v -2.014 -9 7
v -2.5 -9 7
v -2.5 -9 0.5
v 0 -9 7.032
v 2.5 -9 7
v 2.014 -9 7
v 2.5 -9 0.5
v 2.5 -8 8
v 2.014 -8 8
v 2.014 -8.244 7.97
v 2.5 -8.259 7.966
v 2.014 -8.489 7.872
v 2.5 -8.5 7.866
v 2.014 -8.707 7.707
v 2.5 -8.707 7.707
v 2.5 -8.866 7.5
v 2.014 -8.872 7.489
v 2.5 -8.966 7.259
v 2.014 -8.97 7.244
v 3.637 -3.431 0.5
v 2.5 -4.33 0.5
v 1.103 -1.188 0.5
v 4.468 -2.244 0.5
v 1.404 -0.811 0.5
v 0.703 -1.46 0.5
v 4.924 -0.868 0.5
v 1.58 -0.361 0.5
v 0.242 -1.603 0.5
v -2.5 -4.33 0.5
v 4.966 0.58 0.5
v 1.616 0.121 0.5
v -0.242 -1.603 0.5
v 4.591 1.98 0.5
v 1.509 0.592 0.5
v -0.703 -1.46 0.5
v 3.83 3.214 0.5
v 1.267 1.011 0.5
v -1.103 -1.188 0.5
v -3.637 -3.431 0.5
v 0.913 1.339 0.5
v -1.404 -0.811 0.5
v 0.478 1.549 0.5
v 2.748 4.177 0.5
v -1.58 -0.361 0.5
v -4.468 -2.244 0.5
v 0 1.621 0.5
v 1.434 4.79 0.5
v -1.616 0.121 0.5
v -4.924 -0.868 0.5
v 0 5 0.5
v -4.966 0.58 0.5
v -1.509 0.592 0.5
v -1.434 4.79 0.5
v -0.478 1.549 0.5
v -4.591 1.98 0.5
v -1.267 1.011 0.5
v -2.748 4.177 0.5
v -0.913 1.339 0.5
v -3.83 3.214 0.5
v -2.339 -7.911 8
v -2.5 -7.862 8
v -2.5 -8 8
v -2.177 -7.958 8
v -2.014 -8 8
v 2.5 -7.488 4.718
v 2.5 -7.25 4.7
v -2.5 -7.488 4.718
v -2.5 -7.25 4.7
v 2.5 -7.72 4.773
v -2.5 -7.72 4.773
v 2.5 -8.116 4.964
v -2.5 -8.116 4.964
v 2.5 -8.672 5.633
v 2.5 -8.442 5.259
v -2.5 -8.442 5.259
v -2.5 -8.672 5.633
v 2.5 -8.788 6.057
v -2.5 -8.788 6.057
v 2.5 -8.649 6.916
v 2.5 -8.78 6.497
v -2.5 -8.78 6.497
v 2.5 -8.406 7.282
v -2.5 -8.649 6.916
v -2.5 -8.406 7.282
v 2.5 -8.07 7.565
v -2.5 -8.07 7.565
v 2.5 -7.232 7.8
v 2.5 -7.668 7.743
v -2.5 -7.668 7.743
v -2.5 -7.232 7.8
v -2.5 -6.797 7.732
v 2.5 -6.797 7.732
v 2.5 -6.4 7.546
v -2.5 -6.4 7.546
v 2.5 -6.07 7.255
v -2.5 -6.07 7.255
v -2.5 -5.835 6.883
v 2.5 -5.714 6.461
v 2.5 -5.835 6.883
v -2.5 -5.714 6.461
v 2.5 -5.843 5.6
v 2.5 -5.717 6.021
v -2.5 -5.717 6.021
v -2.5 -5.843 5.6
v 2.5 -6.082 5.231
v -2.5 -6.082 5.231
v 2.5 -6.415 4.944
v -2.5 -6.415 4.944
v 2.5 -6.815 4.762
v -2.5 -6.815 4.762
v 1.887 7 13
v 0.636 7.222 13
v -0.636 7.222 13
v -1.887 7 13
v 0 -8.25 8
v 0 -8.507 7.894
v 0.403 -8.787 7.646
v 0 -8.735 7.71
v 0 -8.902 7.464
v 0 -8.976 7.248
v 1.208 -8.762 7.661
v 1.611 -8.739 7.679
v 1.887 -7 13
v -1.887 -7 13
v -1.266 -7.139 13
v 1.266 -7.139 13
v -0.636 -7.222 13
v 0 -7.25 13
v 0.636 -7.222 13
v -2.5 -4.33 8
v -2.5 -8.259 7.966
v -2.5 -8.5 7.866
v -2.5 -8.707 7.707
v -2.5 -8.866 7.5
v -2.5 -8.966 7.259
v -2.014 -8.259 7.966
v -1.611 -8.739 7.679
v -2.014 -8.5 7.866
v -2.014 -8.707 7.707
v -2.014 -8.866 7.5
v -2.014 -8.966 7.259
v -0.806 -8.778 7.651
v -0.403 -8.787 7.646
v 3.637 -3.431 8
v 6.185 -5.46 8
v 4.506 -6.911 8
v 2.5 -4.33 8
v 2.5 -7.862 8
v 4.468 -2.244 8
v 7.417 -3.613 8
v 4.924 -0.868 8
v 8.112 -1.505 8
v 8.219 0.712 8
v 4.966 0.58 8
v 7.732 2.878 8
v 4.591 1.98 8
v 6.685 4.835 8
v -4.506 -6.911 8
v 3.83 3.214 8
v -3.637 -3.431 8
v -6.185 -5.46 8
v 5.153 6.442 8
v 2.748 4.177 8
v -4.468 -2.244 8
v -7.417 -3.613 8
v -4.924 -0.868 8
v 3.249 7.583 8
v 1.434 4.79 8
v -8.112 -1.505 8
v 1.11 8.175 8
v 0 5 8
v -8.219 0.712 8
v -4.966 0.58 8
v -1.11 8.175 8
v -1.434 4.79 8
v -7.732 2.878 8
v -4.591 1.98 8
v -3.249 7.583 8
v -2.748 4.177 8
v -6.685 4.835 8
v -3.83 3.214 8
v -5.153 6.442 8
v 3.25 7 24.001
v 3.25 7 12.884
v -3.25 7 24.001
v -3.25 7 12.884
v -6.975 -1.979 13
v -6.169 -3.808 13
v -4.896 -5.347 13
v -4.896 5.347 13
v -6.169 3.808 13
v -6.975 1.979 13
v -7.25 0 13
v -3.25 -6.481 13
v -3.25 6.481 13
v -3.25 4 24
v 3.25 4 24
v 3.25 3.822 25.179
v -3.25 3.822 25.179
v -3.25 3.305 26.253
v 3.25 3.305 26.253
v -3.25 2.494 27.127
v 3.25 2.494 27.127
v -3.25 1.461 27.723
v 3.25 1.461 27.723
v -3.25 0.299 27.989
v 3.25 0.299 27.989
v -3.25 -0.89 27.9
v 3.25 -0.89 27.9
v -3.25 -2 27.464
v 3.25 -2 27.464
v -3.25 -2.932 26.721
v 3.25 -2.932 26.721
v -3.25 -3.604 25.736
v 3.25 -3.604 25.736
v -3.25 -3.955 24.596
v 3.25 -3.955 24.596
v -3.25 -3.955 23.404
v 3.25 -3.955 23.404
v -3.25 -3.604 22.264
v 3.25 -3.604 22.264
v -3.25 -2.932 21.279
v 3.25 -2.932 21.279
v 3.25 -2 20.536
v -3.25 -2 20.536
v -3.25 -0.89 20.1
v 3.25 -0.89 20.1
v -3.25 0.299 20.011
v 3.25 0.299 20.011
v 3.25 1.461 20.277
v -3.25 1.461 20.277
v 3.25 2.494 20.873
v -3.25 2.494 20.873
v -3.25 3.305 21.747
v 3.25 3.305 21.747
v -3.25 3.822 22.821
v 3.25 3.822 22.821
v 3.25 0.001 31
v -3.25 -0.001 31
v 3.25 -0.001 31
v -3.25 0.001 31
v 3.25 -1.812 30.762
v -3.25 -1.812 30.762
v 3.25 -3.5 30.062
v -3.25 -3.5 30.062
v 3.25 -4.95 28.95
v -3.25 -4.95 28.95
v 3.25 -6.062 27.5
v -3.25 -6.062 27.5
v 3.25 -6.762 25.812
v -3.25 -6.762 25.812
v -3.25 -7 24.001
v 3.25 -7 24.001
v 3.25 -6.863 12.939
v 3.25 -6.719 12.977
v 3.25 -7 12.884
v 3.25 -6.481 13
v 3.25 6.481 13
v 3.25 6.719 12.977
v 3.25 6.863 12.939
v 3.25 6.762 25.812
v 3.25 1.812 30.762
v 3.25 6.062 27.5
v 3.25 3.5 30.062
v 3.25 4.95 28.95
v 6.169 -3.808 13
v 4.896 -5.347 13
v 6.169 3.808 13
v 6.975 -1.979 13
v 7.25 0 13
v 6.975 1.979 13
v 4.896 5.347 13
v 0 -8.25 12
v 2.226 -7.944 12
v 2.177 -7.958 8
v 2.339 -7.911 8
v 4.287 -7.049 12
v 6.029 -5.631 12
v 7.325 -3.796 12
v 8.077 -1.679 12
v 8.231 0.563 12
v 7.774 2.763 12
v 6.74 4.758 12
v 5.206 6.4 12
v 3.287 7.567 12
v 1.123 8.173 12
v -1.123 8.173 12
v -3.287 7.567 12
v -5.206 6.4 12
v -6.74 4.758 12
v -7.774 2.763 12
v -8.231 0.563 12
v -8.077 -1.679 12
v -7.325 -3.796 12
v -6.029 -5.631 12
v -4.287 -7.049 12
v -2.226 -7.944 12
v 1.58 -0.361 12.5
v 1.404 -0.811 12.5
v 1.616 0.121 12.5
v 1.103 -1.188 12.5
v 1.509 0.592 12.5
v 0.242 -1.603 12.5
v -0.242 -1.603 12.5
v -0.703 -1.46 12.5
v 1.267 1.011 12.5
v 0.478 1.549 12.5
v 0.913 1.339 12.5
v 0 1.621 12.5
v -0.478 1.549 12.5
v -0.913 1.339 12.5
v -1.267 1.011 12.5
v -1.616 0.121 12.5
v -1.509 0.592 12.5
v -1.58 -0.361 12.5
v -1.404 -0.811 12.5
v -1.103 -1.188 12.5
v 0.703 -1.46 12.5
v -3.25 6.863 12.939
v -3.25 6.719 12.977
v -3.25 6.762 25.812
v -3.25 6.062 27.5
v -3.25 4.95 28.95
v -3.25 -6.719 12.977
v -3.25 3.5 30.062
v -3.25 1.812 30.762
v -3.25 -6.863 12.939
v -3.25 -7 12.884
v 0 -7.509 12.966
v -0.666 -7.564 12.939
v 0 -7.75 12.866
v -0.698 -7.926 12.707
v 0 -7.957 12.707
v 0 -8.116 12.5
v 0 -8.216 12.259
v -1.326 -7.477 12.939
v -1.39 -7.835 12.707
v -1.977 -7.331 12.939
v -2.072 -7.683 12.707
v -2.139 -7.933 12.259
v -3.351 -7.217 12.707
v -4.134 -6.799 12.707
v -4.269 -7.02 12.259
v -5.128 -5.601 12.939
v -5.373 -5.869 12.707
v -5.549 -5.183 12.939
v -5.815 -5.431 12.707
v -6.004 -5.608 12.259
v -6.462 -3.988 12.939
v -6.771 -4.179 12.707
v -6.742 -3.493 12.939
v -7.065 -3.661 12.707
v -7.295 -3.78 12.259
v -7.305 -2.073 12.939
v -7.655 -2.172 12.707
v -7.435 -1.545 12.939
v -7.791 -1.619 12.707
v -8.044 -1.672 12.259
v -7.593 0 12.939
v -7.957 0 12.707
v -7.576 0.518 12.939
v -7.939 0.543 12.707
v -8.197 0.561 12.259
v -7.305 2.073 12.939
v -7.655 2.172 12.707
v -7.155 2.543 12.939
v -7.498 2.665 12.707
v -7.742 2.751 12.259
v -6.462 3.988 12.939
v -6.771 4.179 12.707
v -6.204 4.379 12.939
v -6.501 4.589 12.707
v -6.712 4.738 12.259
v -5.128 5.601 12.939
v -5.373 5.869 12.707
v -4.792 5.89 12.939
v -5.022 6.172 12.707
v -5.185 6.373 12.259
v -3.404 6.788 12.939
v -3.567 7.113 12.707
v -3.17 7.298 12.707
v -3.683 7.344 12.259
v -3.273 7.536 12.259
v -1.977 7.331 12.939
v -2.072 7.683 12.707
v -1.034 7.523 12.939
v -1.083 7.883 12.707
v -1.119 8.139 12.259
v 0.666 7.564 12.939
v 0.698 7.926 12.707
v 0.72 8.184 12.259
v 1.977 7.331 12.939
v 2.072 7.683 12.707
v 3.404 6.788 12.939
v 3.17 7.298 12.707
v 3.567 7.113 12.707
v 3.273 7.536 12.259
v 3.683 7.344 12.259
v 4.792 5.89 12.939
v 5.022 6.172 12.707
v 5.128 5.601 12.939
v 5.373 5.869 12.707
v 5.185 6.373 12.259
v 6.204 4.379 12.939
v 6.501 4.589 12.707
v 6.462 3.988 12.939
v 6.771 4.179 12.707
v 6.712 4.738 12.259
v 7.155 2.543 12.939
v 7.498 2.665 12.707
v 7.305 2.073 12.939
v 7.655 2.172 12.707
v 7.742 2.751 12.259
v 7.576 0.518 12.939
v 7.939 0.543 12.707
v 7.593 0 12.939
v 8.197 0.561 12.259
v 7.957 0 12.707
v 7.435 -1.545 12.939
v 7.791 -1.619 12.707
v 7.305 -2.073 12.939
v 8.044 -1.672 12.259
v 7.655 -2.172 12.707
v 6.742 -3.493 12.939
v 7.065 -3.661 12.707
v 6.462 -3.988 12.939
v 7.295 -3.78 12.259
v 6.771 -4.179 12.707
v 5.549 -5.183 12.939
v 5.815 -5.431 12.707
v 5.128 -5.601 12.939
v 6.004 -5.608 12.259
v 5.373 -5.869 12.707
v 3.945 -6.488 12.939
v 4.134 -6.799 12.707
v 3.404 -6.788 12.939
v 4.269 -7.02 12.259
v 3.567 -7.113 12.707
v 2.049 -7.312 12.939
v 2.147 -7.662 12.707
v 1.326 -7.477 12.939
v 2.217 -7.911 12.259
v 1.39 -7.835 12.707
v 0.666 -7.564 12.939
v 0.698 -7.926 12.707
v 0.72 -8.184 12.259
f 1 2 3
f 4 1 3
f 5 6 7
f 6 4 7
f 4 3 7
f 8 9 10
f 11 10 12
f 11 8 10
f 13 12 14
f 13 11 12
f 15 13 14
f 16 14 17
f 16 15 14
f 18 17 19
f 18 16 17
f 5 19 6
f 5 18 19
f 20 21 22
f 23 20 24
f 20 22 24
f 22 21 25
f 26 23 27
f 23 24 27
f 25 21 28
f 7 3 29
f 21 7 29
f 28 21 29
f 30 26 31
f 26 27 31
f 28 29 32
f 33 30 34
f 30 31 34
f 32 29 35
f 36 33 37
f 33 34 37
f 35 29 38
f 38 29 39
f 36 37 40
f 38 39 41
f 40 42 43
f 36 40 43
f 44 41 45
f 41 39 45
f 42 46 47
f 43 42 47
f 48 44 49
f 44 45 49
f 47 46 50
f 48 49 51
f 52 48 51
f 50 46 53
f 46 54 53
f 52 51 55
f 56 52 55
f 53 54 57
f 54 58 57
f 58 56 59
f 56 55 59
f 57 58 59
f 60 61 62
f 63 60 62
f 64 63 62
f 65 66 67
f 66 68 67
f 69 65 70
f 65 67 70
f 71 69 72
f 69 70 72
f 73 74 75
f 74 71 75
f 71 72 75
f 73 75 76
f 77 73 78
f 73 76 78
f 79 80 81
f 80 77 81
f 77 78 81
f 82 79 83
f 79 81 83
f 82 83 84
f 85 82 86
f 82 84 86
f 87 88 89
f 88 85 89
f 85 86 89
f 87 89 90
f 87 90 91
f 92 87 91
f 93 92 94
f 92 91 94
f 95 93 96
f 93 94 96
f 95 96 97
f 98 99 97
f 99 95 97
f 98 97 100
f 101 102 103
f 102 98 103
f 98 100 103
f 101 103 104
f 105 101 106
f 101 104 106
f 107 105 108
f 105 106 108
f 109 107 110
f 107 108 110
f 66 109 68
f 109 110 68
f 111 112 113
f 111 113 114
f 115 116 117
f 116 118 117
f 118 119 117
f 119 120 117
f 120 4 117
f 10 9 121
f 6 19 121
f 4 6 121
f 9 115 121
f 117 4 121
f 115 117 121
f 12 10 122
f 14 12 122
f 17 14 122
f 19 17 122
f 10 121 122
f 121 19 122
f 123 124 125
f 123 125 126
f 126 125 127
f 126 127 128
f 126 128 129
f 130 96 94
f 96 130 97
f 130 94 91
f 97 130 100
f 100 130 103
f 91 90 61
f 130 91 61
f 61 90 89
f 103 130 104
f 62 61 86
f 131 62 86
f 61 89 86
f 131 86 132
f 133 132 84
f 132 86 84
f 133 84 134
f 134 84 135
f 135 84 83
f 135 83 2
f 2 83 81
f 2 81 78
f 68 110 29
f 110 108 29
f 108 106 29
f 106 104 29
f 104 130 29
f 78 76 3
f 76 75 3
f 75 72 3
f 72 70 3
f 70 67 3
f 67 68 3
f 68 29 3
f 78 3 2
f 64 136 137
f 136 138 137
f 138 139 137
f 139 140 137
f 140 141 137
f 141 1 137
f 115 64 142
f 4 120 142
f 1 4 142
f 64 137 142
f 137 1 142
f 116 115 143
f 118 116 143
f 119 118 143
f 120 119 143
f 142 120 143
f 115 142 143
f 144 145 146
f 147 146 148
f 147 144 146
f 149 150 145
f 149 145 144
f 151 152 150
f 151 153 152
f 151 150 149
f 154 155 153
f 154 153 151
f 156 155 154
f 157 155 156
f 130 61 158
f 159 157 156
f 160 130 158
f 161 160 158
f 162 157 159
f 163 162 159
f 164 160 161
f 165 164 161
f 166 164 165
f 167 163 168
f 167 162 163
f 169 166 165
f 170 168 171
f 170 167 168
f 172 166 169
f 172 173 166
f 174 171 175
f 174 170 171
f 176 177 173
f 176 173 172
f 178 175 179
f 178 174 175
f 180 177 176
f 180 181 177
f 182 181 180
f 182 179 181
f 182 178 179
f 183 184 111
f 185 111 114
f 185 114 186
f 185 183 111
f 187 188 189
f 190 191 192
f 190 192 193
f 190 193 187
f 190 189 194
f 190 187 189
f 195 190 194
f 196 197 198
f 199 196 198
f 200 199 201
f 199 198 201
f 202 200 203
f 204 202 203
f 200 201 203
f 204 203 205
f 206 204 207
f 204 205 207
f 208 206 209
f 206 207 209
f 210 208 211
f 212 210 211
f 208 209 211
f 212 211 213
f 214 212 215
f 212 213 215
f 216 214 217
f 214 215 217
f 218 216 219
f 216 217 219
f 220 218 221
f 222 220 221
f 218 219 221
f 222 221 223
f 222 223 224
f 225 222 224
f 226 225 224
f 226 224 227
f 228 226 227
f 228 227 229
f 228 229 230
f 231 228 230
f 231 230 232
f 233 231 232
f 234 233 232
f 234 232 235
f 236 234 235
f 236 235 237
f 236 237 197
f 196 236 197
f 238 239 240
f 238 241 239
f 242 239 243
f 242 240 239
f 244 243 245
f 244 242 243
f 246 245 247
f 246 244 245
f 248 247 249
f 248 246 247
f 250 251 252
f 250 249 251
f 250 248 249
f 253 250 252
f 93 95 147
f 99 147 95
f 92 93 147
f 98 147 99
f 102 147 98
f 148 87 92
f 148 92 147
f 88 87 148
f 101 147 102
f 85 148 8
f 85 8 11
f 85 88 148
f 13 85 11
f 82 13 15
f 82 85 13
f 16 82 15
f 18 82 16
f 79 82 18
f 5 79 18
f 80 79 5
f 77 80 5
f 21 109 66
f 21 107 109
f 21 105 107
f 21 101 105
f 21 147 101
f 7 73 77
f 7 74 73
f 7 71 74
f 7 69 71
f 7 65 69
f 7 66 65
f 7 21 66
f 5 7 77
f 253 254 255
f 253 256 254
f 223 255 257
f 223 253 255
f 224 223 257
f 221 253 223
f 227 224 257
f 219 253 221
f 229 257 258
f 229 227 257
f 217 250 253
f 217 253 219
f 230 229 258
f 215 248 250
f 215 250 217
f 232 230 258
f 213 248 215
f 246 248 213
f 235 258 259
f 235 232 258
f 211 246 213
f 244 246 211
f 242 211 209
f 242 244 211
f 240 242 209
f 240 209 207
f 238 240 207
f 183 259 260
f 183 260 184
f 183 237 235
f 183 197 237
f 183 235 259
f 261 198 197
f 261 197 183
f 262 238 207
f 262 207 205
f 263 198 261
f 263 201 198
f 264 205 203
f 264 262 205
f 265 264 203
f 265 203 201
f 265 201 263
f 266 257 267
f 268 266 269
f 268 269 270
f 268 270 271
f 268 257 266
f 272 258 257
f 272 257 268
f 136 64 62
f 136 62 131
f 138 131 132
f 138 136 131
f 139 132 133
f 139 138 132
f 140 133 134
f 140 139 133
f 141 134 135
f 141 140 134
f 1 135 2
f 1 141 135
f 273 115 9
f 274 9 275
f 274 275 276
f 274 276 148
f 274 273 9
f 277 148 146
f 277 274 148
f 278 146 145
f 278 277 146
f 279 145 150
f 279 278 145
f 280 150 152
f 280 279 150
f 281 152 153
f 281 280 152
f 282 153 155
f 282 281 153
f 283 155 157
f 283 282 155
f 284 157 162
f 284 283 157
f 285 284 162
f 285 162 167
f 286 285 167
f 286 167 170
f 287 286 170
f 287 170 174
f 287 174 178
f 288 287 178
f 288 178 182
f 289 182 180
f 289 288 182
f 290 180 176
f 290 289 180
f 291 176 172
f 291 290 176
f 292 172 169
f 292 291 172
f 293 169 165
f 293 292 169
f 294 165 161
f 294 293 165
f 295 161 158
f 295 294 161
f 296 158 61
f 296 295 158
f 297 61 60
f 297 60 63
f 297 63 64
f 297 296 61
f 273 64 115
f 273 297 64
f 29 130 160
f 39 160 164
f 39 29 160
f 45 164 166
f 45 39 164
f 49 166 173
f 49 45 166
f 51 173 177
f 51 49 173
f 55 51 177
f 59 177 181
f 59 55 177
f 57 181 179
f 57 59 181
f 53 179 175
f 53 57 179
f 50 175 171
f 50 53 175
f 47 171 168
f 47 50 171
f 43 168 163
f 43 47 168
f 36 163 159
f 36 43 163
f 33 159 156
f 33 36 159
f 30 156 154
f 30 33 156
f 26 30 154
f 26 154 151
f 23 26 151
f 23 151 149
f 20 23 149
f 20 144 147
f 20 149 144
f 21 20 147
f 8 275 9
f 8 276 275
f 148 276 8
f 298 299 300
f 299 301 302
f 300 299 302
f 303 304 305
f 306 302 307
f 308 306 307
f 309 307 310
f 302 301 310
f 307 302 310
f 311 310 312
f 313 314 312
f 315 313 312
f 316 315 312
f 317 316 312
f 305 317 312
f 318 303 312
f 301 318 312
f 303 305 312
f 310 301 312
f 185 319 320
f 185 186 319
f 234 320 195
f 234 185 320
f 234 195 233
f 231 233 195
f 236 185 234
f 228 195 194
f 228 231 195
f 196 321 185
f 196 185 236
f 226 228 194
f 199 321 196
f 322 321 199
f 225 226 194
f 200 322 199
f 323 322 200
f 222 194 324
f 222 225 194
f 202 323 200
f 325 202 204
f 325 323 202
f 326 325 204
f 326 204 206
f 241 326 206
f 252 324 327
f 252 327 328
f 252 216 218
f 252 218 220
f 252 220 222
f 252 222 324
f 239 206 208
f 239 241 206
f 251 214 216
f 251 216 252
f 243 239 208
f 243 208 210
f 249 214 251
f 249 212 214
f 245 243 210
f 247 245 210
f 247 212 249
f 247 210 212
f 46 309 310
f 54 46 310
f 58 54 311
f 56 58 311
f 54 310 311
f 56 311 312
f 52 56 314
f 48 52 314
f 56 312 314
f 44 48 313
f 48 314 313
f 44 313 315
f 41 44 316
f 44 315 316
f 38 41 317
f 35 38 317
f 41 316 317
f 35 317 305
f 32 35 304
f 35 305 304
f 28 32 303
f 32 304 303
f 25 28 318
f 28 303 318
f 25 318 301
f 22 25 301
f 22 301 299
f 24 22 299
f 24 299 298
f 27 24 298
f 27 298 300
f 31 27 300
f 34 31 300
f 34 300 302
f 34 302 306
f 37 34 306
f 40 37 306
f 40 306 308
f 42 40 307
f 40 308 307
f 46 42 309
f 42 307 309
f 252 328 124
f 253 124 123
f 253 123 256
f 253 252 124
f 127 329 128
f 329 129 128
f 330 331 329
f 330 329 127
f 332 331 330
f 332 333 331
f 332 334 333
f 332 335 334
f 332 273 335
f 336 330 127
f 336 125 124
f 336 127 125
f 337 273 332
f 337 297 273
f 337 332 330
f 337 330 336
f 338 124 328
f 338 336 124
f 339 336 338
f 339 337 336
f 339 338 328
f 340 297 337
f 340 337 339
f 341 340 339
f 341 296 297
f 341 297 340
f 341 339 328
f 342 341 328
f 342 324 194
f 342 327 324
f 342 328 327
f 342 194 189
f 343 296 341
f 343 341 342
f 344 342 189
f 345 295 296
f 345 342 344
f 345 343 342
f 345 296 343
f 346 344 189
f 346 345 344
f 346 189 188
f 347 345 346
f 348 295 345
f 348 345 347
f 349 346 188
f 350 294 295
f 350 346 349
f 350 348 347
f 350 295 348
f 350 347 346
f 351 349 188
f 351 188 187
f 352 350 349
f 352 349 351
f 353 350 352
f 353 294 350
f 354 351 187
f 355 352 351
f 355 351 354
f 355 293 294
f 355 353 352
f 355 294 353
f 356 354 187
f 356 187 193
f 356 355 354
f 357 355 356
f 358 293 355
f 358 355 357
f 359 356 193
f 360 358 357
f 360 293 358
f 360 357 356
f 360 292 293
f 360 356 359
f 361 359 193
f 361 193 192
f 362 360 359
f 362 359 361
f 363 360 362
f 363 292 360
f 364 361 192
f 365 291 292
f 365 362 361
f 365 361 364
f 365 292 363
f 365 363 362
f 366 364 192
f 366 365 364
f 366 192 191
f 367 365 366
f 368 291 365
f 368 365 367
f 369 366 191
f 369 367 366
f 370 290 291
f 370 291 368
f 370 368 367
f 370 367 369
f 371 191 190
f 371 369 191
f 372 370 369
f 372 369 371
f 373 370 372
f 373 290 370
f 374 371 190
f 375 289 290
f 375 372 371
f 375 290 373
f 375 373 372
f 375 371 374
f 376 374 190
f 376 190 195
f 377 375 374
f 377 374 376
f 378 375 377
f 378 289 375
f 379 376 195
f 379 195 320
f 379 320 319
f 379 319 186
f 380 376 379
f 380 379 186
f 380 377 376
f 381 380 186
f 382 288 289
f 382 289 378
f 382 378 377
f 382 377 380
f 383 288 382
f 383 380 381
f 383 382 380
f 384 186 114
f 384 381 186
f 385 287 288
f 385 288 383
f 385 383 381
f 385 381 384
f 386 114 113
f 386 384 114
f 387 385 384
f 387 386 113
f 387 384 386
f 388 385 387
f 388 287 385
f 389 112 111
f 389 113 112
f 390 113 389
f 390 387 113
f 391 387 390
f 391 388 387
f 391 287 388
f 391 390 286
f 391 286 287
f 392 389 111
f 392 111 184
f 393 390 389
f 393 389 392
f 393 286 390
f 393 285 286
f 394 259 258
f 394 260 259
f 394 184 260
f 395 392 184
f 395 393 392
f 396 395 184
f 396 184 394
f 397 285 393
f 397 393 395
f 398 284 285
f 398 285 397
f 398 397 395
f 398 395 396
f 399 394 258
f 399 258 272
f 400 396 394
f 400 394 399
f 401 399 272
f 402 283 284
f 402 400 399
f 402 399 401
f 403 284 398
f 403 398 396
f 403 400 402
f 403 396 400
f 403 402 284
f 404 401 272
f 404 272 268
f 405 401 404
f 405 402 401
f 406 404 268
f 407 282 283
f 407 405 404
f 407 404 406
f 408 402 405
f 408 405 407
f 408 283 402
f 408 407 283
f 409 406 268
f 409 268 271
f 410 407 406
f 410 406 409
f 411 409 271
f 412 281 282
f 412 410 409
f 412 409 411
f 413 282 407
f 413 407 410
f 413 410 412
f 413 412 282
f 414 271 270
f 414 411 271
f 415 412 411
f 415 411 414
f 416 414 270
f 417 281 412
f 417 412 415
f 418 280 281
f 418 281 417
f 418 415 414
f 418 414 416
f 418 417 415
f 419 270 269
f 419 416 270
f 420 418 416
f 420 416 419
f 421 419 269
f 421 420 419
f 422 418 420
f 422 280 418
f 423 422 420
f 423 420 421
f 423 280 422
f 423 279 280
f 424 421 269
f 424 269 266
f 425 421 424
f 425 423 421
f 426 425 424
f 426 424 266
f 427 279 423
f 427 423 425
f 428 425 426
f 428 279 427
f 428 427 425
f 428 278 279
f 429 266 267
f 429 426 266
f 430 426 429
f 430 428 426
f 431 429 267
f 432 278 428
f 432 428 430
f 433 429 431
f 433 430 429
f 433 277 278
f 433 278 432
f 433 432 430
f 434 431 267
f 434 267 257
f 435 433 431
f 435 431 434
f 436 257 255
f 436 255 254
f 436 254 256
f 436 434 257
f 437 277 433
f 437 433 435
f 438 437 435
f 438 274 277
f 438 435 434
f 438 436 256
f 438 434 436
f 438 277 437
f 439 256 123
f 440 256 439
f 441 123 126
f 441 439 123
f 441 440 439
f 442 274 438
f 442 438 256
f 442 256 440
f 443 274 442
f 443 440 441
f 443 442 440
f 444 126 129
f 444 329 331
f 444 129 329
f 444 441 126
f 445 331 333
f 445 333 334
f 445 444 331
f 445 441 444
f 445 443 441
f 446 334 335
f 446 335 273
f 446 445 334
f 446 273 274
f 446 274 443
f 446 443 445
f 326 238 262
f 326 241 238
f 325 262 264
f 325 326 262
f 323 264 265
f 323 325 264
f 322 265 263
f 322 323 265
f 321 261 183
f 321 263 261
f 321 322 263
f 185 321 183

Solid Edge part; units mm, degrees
sketch "Sketch1" plane through (0, 0, 0) normal (0, 0, 1) x (1, 0, 0)
  circle A0 centre (0, 0) radius 9.75
  dimension "D1" = 19.5
extrude "Protrusion1" add sketch "Sketch1" along normal blind 31
sketch "Sketch2" plane through (0, 0, 0) normal (0, 0, -1) x (1, 0, 0)
  line L0 (-2.5, 4.3301) -> (-2.5, 9)
  line L1 (-2.5, 9) -> (2.5, 9)
  line L2 (2.5, 4.3301) -> (2.5, 9)
  arc A0 (2.5, 4.3301) -> (-2.5, 4.3301) centre (0, 0) cw
extrude "Extrusionsausschnitt_1" cut sketch "Sketch2" against normal blind 8 flip side to cut
sketch "Sketch3" plane through (0, 0, 31) normal (0, 0, 1) x (0, -1, 0)
  circle A0 centre (0, 0) radius 8.25
  dimension "D1" = 16.5
extrude "Extrusionsausschnitt_2" cut sketch "Sketch3" against normal blind 23 flip side to cut
hole "Bohrung_1" at (2.5, -7.25, 6.25) direction (-1, 0, 0) diameter 3.1 end up to next
sketch "Sketch4" plane through (0, 0, 31) normal (0, 0, 1) x (0, 1, 0)
  line L0 (-7, -3.25) -> (7, -3.25)
  line L1 (7, -3.25) -> (7, 3.25)
  line L2 (7, 3.25) -> (-7, 3.25)
  line L3 (-7, 3.25) -> (-7, -3.25)
  dimension "D1" = 6.5
  dimension "D2" = 14
extrude "Extrusionsausschnitt_3" cut sketch "Sketch4" against normal blind 18 flip side to cut
fillet "Verrundung_3" radius 7 2 edges at (0, -7, 31) (0, 7, 31)
sketch "Sketch5" plane through (3.25, 0, 22) normal (1, 0, 0) x (0, 1, 0)
  circle A0 centre (0, 2) radius 4
  dimension "D1" = 8
extrude "Extrusionsausschnitt_5" cut sketch "Sketch5" against normal blind 30
fillet "Verrundung_4" radius 1 1 edges at (-8.25, 0, 13)
sketch "Sketch6" plane through (0, 0, 0) normal (1, 0, 0) x (0, 1, 0)
  line L0 (-9.424, 0.5) -> (5, 0.5)
  dimension "D1" = 0.5
extrude "Extrusionsausschnitt_6" cut sketch "Sketch6" along normal mid plane 852 material side at (0, -2.212, 0.45)
fillet "Verrundung_5" radius 1 1 edges at (0, -9, 8)
hole "Bohrung_2" at (0, 0, 0.5) direction (0, 0, 1) diameter 3.242 depth 12
